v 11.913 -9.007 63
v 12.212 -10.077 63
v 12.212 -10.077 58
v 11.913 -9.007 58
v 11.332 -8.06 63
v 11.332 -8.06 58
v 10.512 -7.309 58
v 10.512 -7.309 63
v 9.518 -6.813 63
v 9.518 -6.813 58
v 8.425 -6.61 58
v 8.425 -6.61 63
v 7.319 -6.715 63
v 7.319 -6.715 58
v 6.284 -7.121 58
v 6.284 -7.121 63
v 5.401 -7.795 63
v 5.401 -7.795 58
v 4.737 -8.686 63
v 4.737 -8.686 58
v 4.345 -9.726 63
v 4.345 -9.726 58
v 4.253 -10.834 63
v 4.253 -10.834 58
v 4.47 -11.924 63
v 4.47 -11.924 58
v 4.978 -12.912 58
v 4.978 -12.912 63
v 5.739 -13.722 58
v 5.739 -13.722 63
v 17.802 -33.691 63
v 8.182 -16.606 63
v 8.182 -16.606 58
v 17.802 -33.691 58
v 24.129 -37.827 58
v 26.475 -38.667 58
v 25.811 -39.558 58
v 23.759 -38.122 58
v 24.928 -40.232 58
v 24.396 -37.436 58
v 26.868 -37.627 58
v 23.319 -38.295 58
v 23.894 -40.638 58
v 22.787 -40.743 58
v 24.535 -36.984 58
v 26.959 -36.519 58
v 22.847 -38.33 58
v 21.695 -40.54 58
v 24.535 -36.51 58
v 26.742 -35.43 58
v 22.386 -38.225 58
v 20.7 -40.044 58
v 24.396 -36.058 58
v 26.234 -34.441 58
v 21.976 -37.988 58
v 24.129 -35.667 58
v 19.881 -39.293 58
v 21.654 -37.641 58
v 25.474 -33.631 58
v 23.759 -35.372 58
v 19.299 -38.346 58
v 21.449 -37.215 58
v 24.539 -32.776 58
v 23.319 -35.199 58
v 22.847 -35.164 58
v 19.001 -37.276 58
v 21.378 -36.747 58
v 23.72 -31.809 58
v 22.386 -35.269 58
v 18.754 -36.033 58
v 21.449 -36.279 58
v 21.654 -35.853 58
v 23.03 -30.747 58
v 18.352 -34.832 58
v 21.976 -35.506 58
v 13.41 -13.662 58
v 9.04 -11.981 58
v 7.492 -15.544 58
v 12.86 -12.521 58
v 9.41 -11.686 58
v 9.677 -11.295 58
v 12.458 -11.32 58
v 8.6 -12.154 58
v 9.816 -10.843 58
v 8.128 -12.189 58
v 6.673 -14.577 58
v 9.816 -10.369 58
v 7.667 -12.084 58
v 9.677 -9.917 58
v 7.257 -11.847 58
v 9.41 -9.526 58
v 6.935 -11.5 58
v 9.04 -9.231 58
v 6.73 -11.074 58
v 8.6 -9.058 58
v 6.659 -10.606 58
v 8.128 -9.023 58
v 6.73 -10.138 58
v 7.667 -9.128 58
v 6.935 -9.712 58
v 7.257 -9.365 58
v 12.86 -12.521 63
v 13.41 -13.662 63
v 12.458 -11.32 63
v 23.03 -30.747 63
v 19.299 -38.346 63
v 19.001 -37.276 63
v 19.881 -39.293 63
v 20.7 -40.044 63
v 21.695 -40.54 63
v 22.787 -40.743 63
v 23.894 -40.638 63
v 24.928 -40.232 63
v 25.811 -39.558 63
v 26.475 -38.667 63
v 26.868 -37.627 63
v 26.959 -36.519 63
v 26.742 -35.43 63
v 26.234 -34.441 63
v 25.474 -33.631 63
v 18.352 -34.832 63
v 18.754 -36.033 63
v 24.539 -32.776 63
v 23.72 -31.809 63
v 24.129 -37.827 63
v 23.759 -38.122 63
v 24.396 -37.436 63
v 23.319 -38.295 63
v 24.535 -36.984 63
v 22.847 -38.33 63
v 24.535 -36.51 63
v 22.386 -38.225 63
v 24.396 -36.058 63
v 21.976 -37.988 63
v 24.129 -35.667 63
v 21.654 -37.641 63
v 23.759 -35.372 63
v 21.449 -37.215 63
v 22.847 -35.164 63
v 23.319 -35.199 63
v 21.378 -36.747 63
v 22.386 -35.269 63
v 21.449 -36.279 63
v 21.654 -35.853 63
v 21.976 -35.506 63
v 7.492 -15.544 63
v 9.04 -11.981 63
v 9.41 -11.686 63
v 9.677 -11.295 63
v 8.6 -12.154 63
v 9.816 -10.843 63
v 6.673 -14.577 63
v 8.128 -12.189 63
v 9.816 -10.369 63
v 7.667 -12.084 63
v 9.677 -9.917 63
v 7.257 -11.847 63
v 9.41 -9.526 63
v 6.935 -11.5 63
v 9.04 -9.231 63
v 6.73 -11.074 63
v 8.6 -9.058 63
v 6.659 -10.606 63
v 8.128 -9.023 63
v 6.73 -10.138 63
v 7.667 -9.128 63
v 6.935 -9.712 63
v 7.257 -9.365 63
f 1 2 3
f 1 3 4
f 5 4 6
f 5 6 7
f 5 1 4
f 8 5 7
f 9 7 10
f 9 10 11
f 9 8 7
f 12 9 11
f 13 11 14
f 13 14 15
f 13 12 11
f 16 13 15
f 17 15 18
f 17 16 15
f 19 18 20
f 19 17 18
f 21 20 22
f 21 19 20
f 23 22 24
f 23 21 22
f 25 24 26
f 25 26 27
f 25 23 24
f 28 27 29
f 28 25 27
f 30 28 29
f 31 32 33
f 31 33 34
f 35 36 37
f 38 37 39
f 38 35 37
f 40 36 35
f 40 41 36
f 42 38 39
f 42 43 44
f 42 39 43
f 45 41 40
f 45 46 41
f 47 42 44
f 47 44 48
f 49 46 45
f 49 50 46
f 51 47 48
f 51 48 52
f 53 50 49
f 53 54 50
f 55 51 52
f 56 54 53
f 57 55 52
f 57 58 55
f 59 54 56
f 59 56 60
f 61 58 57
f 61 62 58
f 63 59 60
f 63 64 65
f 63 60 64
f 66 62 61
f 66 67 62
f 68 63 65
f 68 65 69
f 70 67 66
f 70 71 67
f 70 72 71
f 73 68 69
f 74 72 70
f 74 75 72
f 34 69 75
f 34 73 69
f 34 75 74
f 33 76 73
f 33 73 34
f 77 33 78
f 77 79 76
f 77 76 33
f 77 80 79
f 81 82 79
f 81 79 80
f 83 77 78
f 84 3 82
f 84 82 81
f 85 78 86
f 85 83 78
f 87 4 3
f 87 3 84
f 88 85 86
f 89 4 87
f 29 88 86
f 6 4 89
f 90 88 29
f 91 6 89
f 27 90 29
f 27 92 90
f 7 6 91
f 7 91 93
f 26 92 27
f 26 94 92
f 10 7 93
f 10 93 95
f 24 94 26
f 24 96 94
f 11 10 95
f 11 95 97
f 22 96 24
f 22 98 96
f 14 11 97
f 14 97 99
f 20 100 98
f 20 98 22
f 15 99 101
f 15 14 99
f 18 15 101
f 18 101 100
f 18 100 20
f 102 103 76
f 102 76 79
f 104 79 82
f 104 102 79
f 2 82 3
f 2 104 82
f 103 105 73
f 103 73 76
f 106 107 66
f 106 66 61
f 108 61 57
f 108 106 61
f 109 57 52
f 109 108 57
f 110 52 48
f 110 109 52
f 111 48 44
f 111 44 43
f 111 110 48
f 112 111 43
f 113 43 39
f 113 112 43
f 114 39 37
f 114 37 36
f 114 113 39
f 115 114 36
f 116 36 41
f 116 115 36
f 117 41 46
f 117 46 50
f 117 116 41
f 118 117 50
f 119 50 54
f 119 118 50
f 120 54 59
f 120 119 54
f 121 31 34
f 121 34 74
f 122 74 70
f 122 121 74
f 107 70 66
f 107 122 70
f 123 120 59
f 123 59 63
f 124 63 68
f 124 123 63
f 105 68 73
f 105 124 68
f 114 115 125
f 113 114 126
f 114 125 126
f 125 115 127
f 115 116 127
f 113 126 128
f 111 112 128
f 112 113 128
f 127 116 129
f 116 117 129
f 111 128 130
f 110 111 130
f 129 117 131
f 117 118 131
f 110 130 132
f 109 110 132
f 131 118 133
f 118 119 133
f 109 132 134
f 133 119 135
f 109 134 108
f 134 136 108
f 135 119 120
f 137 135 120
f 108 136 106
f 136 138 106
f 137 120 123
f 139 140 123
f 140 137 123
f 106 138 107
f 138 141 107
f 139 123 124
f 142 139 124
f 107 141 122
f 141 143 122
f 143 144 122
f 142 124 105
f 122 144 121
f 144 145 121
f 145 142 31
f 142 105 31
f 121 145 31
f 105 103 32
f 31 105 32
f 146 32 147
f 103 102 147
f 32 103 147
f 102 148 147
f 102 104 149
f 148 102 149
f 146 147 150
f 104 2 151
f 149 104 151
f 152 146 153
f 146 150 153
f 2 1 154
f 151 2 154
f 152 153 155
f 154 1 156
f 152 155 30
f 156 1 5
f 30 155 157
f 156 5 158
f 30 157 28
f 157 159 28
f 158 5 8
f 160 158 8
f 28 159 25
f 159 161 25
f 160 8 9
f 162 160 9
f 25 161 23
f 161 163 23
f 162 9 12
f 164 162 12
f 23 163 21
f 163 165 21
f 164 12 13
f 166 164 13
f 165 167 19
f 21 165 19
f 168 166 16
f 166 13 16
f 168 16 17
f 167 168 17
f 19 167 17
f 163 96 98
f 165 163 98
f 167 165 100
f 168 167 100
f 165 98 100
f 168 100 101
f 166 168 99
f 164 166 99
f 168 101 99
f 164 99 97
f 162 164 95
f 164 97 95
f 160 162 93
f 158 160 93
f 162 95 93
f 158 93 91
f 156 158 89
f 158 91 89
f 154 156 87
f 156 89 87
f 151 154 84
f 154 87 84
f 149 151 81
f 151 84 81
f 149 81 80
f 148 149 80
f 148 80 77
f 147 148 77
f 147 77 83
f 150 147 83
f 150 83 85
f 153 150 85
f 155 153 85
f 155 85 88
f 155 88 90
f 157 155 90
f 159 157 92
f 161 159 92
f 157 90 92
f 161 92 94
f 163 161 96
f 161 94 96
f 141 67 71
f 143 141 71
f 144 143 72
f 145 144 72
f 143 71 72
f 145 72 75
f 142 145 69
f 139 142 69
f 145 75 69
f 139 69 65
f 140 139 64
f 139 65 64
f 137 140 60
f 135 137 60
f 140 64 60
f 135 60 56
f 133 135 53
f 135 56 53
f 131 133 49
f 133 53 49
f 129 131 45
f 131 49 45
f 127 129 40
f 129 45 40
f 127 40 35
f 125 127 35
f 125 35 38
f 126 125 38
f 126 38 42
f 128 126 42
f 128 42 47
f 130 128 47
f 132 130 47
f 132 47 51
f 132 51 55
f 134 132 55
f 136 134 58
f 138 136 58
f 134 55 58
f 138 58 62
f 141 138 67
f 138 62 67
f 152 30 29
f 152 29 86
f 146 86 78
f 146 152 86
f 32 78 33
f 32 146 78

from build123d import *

# Parameters (mm, degrees)
SKETCH1_R           = 2
BOSS_EXTRUDE1_DEPTH = 5
SKETCH2_R           = 2
SKETCH2_R_2         = 1.5875
BOSS_EXTRUDE2_DEPTH = 5
SKETCH3_R           = 2
SKETCH3_R_2         = 1.5875
BOSS_EXTRUDE3_DEPTH = 5


with BuildPart() as part:
    # Sketch1 → Boss-Extrude1 (new body)
    with BuildSketch(Plane.XY.offset(63)):
        with BuildLine():
            Line((8.181928414, -16.605718064), (17.802171103, -33.691169181))
            ThreePointArc((17.802171103, -33.691169181), (18.572370652, -35.426303597), (19.000782012, -37.275725803))
            ThreePointArc((19.000782012, -37.275725803), (24.928229029, -40.232462465), (25.473776059, -33.631000637))
            ThreePointArc((25.473776059, -33.631000637), (24.114589128, -32.30566684), (23.030358602, -30.747352701))
            Line((23.030358602, -30.747352701), (13.410115914, -13.661901584))
            ThreePointArc((13.410115914, -13.661901584), (12.639916365, -11.926767167), (12.211505005, -10.077344962))
            ThreePointArc((12.211505005, -10.077344962), (6.284057988, -7.1206083), (5.738510958, -13.722070128))
            ThreePointArc((5.738510958, -13.722070128), (7.097697889, -15.047403925), (8.181928414, -16.605718064))
        make_face()
        with Locations(Location((8.246602308, -10.606066633, 0), (0, 0, 180))):
            Circle(SKETCH1_R, mode=Mode.SUBTRACT)
        with Locations(Location((22.965684708, -36.747004132, 0), (0, 0, 180))):
            Circle(SKETCH1_R, mode=Mode.SUBTRACT)
    extrude(amount=-BOSS_EXTRUDE1_DEPTH)

    # Sketch2 → Boss-Extrude2 (add, through all)
    with BuildSketch(Plane(origin=(0, 0, 58), x_dir=(-1, 0, 0), z_dir=(0, 0, -1))):
        with Locations((-22.965684708, -36.747004132)):
            Circle(SKETCH2_R)
        with Locations((-22.965684708, -36.747004132)):
            Circle(SKETCH2_R_2, mode=Mode.SUBTRACT)
    extrude(amount=-BOSS_EXTRUDE2_DEPTH)

    # Sketch3 → Boss-Extrude3 (add, through all)
    with BuildSketch(Plane(origin=(0, 0, 58), x_dir=(-1, 0, 0), z_dir=(0, 0, -1))):
        with Locations((-8.246602308, -10.606066633)):
            Circle(SKETCH3_R)
        with Locations((-8.246602308, -10.606066633)):
            Circle(SKETCH3_R_2, mode=Mode.SUBTRACT)
    extrude(amount=-BOSS_EXTRUDE3_DEPTH)


solid = part.part
